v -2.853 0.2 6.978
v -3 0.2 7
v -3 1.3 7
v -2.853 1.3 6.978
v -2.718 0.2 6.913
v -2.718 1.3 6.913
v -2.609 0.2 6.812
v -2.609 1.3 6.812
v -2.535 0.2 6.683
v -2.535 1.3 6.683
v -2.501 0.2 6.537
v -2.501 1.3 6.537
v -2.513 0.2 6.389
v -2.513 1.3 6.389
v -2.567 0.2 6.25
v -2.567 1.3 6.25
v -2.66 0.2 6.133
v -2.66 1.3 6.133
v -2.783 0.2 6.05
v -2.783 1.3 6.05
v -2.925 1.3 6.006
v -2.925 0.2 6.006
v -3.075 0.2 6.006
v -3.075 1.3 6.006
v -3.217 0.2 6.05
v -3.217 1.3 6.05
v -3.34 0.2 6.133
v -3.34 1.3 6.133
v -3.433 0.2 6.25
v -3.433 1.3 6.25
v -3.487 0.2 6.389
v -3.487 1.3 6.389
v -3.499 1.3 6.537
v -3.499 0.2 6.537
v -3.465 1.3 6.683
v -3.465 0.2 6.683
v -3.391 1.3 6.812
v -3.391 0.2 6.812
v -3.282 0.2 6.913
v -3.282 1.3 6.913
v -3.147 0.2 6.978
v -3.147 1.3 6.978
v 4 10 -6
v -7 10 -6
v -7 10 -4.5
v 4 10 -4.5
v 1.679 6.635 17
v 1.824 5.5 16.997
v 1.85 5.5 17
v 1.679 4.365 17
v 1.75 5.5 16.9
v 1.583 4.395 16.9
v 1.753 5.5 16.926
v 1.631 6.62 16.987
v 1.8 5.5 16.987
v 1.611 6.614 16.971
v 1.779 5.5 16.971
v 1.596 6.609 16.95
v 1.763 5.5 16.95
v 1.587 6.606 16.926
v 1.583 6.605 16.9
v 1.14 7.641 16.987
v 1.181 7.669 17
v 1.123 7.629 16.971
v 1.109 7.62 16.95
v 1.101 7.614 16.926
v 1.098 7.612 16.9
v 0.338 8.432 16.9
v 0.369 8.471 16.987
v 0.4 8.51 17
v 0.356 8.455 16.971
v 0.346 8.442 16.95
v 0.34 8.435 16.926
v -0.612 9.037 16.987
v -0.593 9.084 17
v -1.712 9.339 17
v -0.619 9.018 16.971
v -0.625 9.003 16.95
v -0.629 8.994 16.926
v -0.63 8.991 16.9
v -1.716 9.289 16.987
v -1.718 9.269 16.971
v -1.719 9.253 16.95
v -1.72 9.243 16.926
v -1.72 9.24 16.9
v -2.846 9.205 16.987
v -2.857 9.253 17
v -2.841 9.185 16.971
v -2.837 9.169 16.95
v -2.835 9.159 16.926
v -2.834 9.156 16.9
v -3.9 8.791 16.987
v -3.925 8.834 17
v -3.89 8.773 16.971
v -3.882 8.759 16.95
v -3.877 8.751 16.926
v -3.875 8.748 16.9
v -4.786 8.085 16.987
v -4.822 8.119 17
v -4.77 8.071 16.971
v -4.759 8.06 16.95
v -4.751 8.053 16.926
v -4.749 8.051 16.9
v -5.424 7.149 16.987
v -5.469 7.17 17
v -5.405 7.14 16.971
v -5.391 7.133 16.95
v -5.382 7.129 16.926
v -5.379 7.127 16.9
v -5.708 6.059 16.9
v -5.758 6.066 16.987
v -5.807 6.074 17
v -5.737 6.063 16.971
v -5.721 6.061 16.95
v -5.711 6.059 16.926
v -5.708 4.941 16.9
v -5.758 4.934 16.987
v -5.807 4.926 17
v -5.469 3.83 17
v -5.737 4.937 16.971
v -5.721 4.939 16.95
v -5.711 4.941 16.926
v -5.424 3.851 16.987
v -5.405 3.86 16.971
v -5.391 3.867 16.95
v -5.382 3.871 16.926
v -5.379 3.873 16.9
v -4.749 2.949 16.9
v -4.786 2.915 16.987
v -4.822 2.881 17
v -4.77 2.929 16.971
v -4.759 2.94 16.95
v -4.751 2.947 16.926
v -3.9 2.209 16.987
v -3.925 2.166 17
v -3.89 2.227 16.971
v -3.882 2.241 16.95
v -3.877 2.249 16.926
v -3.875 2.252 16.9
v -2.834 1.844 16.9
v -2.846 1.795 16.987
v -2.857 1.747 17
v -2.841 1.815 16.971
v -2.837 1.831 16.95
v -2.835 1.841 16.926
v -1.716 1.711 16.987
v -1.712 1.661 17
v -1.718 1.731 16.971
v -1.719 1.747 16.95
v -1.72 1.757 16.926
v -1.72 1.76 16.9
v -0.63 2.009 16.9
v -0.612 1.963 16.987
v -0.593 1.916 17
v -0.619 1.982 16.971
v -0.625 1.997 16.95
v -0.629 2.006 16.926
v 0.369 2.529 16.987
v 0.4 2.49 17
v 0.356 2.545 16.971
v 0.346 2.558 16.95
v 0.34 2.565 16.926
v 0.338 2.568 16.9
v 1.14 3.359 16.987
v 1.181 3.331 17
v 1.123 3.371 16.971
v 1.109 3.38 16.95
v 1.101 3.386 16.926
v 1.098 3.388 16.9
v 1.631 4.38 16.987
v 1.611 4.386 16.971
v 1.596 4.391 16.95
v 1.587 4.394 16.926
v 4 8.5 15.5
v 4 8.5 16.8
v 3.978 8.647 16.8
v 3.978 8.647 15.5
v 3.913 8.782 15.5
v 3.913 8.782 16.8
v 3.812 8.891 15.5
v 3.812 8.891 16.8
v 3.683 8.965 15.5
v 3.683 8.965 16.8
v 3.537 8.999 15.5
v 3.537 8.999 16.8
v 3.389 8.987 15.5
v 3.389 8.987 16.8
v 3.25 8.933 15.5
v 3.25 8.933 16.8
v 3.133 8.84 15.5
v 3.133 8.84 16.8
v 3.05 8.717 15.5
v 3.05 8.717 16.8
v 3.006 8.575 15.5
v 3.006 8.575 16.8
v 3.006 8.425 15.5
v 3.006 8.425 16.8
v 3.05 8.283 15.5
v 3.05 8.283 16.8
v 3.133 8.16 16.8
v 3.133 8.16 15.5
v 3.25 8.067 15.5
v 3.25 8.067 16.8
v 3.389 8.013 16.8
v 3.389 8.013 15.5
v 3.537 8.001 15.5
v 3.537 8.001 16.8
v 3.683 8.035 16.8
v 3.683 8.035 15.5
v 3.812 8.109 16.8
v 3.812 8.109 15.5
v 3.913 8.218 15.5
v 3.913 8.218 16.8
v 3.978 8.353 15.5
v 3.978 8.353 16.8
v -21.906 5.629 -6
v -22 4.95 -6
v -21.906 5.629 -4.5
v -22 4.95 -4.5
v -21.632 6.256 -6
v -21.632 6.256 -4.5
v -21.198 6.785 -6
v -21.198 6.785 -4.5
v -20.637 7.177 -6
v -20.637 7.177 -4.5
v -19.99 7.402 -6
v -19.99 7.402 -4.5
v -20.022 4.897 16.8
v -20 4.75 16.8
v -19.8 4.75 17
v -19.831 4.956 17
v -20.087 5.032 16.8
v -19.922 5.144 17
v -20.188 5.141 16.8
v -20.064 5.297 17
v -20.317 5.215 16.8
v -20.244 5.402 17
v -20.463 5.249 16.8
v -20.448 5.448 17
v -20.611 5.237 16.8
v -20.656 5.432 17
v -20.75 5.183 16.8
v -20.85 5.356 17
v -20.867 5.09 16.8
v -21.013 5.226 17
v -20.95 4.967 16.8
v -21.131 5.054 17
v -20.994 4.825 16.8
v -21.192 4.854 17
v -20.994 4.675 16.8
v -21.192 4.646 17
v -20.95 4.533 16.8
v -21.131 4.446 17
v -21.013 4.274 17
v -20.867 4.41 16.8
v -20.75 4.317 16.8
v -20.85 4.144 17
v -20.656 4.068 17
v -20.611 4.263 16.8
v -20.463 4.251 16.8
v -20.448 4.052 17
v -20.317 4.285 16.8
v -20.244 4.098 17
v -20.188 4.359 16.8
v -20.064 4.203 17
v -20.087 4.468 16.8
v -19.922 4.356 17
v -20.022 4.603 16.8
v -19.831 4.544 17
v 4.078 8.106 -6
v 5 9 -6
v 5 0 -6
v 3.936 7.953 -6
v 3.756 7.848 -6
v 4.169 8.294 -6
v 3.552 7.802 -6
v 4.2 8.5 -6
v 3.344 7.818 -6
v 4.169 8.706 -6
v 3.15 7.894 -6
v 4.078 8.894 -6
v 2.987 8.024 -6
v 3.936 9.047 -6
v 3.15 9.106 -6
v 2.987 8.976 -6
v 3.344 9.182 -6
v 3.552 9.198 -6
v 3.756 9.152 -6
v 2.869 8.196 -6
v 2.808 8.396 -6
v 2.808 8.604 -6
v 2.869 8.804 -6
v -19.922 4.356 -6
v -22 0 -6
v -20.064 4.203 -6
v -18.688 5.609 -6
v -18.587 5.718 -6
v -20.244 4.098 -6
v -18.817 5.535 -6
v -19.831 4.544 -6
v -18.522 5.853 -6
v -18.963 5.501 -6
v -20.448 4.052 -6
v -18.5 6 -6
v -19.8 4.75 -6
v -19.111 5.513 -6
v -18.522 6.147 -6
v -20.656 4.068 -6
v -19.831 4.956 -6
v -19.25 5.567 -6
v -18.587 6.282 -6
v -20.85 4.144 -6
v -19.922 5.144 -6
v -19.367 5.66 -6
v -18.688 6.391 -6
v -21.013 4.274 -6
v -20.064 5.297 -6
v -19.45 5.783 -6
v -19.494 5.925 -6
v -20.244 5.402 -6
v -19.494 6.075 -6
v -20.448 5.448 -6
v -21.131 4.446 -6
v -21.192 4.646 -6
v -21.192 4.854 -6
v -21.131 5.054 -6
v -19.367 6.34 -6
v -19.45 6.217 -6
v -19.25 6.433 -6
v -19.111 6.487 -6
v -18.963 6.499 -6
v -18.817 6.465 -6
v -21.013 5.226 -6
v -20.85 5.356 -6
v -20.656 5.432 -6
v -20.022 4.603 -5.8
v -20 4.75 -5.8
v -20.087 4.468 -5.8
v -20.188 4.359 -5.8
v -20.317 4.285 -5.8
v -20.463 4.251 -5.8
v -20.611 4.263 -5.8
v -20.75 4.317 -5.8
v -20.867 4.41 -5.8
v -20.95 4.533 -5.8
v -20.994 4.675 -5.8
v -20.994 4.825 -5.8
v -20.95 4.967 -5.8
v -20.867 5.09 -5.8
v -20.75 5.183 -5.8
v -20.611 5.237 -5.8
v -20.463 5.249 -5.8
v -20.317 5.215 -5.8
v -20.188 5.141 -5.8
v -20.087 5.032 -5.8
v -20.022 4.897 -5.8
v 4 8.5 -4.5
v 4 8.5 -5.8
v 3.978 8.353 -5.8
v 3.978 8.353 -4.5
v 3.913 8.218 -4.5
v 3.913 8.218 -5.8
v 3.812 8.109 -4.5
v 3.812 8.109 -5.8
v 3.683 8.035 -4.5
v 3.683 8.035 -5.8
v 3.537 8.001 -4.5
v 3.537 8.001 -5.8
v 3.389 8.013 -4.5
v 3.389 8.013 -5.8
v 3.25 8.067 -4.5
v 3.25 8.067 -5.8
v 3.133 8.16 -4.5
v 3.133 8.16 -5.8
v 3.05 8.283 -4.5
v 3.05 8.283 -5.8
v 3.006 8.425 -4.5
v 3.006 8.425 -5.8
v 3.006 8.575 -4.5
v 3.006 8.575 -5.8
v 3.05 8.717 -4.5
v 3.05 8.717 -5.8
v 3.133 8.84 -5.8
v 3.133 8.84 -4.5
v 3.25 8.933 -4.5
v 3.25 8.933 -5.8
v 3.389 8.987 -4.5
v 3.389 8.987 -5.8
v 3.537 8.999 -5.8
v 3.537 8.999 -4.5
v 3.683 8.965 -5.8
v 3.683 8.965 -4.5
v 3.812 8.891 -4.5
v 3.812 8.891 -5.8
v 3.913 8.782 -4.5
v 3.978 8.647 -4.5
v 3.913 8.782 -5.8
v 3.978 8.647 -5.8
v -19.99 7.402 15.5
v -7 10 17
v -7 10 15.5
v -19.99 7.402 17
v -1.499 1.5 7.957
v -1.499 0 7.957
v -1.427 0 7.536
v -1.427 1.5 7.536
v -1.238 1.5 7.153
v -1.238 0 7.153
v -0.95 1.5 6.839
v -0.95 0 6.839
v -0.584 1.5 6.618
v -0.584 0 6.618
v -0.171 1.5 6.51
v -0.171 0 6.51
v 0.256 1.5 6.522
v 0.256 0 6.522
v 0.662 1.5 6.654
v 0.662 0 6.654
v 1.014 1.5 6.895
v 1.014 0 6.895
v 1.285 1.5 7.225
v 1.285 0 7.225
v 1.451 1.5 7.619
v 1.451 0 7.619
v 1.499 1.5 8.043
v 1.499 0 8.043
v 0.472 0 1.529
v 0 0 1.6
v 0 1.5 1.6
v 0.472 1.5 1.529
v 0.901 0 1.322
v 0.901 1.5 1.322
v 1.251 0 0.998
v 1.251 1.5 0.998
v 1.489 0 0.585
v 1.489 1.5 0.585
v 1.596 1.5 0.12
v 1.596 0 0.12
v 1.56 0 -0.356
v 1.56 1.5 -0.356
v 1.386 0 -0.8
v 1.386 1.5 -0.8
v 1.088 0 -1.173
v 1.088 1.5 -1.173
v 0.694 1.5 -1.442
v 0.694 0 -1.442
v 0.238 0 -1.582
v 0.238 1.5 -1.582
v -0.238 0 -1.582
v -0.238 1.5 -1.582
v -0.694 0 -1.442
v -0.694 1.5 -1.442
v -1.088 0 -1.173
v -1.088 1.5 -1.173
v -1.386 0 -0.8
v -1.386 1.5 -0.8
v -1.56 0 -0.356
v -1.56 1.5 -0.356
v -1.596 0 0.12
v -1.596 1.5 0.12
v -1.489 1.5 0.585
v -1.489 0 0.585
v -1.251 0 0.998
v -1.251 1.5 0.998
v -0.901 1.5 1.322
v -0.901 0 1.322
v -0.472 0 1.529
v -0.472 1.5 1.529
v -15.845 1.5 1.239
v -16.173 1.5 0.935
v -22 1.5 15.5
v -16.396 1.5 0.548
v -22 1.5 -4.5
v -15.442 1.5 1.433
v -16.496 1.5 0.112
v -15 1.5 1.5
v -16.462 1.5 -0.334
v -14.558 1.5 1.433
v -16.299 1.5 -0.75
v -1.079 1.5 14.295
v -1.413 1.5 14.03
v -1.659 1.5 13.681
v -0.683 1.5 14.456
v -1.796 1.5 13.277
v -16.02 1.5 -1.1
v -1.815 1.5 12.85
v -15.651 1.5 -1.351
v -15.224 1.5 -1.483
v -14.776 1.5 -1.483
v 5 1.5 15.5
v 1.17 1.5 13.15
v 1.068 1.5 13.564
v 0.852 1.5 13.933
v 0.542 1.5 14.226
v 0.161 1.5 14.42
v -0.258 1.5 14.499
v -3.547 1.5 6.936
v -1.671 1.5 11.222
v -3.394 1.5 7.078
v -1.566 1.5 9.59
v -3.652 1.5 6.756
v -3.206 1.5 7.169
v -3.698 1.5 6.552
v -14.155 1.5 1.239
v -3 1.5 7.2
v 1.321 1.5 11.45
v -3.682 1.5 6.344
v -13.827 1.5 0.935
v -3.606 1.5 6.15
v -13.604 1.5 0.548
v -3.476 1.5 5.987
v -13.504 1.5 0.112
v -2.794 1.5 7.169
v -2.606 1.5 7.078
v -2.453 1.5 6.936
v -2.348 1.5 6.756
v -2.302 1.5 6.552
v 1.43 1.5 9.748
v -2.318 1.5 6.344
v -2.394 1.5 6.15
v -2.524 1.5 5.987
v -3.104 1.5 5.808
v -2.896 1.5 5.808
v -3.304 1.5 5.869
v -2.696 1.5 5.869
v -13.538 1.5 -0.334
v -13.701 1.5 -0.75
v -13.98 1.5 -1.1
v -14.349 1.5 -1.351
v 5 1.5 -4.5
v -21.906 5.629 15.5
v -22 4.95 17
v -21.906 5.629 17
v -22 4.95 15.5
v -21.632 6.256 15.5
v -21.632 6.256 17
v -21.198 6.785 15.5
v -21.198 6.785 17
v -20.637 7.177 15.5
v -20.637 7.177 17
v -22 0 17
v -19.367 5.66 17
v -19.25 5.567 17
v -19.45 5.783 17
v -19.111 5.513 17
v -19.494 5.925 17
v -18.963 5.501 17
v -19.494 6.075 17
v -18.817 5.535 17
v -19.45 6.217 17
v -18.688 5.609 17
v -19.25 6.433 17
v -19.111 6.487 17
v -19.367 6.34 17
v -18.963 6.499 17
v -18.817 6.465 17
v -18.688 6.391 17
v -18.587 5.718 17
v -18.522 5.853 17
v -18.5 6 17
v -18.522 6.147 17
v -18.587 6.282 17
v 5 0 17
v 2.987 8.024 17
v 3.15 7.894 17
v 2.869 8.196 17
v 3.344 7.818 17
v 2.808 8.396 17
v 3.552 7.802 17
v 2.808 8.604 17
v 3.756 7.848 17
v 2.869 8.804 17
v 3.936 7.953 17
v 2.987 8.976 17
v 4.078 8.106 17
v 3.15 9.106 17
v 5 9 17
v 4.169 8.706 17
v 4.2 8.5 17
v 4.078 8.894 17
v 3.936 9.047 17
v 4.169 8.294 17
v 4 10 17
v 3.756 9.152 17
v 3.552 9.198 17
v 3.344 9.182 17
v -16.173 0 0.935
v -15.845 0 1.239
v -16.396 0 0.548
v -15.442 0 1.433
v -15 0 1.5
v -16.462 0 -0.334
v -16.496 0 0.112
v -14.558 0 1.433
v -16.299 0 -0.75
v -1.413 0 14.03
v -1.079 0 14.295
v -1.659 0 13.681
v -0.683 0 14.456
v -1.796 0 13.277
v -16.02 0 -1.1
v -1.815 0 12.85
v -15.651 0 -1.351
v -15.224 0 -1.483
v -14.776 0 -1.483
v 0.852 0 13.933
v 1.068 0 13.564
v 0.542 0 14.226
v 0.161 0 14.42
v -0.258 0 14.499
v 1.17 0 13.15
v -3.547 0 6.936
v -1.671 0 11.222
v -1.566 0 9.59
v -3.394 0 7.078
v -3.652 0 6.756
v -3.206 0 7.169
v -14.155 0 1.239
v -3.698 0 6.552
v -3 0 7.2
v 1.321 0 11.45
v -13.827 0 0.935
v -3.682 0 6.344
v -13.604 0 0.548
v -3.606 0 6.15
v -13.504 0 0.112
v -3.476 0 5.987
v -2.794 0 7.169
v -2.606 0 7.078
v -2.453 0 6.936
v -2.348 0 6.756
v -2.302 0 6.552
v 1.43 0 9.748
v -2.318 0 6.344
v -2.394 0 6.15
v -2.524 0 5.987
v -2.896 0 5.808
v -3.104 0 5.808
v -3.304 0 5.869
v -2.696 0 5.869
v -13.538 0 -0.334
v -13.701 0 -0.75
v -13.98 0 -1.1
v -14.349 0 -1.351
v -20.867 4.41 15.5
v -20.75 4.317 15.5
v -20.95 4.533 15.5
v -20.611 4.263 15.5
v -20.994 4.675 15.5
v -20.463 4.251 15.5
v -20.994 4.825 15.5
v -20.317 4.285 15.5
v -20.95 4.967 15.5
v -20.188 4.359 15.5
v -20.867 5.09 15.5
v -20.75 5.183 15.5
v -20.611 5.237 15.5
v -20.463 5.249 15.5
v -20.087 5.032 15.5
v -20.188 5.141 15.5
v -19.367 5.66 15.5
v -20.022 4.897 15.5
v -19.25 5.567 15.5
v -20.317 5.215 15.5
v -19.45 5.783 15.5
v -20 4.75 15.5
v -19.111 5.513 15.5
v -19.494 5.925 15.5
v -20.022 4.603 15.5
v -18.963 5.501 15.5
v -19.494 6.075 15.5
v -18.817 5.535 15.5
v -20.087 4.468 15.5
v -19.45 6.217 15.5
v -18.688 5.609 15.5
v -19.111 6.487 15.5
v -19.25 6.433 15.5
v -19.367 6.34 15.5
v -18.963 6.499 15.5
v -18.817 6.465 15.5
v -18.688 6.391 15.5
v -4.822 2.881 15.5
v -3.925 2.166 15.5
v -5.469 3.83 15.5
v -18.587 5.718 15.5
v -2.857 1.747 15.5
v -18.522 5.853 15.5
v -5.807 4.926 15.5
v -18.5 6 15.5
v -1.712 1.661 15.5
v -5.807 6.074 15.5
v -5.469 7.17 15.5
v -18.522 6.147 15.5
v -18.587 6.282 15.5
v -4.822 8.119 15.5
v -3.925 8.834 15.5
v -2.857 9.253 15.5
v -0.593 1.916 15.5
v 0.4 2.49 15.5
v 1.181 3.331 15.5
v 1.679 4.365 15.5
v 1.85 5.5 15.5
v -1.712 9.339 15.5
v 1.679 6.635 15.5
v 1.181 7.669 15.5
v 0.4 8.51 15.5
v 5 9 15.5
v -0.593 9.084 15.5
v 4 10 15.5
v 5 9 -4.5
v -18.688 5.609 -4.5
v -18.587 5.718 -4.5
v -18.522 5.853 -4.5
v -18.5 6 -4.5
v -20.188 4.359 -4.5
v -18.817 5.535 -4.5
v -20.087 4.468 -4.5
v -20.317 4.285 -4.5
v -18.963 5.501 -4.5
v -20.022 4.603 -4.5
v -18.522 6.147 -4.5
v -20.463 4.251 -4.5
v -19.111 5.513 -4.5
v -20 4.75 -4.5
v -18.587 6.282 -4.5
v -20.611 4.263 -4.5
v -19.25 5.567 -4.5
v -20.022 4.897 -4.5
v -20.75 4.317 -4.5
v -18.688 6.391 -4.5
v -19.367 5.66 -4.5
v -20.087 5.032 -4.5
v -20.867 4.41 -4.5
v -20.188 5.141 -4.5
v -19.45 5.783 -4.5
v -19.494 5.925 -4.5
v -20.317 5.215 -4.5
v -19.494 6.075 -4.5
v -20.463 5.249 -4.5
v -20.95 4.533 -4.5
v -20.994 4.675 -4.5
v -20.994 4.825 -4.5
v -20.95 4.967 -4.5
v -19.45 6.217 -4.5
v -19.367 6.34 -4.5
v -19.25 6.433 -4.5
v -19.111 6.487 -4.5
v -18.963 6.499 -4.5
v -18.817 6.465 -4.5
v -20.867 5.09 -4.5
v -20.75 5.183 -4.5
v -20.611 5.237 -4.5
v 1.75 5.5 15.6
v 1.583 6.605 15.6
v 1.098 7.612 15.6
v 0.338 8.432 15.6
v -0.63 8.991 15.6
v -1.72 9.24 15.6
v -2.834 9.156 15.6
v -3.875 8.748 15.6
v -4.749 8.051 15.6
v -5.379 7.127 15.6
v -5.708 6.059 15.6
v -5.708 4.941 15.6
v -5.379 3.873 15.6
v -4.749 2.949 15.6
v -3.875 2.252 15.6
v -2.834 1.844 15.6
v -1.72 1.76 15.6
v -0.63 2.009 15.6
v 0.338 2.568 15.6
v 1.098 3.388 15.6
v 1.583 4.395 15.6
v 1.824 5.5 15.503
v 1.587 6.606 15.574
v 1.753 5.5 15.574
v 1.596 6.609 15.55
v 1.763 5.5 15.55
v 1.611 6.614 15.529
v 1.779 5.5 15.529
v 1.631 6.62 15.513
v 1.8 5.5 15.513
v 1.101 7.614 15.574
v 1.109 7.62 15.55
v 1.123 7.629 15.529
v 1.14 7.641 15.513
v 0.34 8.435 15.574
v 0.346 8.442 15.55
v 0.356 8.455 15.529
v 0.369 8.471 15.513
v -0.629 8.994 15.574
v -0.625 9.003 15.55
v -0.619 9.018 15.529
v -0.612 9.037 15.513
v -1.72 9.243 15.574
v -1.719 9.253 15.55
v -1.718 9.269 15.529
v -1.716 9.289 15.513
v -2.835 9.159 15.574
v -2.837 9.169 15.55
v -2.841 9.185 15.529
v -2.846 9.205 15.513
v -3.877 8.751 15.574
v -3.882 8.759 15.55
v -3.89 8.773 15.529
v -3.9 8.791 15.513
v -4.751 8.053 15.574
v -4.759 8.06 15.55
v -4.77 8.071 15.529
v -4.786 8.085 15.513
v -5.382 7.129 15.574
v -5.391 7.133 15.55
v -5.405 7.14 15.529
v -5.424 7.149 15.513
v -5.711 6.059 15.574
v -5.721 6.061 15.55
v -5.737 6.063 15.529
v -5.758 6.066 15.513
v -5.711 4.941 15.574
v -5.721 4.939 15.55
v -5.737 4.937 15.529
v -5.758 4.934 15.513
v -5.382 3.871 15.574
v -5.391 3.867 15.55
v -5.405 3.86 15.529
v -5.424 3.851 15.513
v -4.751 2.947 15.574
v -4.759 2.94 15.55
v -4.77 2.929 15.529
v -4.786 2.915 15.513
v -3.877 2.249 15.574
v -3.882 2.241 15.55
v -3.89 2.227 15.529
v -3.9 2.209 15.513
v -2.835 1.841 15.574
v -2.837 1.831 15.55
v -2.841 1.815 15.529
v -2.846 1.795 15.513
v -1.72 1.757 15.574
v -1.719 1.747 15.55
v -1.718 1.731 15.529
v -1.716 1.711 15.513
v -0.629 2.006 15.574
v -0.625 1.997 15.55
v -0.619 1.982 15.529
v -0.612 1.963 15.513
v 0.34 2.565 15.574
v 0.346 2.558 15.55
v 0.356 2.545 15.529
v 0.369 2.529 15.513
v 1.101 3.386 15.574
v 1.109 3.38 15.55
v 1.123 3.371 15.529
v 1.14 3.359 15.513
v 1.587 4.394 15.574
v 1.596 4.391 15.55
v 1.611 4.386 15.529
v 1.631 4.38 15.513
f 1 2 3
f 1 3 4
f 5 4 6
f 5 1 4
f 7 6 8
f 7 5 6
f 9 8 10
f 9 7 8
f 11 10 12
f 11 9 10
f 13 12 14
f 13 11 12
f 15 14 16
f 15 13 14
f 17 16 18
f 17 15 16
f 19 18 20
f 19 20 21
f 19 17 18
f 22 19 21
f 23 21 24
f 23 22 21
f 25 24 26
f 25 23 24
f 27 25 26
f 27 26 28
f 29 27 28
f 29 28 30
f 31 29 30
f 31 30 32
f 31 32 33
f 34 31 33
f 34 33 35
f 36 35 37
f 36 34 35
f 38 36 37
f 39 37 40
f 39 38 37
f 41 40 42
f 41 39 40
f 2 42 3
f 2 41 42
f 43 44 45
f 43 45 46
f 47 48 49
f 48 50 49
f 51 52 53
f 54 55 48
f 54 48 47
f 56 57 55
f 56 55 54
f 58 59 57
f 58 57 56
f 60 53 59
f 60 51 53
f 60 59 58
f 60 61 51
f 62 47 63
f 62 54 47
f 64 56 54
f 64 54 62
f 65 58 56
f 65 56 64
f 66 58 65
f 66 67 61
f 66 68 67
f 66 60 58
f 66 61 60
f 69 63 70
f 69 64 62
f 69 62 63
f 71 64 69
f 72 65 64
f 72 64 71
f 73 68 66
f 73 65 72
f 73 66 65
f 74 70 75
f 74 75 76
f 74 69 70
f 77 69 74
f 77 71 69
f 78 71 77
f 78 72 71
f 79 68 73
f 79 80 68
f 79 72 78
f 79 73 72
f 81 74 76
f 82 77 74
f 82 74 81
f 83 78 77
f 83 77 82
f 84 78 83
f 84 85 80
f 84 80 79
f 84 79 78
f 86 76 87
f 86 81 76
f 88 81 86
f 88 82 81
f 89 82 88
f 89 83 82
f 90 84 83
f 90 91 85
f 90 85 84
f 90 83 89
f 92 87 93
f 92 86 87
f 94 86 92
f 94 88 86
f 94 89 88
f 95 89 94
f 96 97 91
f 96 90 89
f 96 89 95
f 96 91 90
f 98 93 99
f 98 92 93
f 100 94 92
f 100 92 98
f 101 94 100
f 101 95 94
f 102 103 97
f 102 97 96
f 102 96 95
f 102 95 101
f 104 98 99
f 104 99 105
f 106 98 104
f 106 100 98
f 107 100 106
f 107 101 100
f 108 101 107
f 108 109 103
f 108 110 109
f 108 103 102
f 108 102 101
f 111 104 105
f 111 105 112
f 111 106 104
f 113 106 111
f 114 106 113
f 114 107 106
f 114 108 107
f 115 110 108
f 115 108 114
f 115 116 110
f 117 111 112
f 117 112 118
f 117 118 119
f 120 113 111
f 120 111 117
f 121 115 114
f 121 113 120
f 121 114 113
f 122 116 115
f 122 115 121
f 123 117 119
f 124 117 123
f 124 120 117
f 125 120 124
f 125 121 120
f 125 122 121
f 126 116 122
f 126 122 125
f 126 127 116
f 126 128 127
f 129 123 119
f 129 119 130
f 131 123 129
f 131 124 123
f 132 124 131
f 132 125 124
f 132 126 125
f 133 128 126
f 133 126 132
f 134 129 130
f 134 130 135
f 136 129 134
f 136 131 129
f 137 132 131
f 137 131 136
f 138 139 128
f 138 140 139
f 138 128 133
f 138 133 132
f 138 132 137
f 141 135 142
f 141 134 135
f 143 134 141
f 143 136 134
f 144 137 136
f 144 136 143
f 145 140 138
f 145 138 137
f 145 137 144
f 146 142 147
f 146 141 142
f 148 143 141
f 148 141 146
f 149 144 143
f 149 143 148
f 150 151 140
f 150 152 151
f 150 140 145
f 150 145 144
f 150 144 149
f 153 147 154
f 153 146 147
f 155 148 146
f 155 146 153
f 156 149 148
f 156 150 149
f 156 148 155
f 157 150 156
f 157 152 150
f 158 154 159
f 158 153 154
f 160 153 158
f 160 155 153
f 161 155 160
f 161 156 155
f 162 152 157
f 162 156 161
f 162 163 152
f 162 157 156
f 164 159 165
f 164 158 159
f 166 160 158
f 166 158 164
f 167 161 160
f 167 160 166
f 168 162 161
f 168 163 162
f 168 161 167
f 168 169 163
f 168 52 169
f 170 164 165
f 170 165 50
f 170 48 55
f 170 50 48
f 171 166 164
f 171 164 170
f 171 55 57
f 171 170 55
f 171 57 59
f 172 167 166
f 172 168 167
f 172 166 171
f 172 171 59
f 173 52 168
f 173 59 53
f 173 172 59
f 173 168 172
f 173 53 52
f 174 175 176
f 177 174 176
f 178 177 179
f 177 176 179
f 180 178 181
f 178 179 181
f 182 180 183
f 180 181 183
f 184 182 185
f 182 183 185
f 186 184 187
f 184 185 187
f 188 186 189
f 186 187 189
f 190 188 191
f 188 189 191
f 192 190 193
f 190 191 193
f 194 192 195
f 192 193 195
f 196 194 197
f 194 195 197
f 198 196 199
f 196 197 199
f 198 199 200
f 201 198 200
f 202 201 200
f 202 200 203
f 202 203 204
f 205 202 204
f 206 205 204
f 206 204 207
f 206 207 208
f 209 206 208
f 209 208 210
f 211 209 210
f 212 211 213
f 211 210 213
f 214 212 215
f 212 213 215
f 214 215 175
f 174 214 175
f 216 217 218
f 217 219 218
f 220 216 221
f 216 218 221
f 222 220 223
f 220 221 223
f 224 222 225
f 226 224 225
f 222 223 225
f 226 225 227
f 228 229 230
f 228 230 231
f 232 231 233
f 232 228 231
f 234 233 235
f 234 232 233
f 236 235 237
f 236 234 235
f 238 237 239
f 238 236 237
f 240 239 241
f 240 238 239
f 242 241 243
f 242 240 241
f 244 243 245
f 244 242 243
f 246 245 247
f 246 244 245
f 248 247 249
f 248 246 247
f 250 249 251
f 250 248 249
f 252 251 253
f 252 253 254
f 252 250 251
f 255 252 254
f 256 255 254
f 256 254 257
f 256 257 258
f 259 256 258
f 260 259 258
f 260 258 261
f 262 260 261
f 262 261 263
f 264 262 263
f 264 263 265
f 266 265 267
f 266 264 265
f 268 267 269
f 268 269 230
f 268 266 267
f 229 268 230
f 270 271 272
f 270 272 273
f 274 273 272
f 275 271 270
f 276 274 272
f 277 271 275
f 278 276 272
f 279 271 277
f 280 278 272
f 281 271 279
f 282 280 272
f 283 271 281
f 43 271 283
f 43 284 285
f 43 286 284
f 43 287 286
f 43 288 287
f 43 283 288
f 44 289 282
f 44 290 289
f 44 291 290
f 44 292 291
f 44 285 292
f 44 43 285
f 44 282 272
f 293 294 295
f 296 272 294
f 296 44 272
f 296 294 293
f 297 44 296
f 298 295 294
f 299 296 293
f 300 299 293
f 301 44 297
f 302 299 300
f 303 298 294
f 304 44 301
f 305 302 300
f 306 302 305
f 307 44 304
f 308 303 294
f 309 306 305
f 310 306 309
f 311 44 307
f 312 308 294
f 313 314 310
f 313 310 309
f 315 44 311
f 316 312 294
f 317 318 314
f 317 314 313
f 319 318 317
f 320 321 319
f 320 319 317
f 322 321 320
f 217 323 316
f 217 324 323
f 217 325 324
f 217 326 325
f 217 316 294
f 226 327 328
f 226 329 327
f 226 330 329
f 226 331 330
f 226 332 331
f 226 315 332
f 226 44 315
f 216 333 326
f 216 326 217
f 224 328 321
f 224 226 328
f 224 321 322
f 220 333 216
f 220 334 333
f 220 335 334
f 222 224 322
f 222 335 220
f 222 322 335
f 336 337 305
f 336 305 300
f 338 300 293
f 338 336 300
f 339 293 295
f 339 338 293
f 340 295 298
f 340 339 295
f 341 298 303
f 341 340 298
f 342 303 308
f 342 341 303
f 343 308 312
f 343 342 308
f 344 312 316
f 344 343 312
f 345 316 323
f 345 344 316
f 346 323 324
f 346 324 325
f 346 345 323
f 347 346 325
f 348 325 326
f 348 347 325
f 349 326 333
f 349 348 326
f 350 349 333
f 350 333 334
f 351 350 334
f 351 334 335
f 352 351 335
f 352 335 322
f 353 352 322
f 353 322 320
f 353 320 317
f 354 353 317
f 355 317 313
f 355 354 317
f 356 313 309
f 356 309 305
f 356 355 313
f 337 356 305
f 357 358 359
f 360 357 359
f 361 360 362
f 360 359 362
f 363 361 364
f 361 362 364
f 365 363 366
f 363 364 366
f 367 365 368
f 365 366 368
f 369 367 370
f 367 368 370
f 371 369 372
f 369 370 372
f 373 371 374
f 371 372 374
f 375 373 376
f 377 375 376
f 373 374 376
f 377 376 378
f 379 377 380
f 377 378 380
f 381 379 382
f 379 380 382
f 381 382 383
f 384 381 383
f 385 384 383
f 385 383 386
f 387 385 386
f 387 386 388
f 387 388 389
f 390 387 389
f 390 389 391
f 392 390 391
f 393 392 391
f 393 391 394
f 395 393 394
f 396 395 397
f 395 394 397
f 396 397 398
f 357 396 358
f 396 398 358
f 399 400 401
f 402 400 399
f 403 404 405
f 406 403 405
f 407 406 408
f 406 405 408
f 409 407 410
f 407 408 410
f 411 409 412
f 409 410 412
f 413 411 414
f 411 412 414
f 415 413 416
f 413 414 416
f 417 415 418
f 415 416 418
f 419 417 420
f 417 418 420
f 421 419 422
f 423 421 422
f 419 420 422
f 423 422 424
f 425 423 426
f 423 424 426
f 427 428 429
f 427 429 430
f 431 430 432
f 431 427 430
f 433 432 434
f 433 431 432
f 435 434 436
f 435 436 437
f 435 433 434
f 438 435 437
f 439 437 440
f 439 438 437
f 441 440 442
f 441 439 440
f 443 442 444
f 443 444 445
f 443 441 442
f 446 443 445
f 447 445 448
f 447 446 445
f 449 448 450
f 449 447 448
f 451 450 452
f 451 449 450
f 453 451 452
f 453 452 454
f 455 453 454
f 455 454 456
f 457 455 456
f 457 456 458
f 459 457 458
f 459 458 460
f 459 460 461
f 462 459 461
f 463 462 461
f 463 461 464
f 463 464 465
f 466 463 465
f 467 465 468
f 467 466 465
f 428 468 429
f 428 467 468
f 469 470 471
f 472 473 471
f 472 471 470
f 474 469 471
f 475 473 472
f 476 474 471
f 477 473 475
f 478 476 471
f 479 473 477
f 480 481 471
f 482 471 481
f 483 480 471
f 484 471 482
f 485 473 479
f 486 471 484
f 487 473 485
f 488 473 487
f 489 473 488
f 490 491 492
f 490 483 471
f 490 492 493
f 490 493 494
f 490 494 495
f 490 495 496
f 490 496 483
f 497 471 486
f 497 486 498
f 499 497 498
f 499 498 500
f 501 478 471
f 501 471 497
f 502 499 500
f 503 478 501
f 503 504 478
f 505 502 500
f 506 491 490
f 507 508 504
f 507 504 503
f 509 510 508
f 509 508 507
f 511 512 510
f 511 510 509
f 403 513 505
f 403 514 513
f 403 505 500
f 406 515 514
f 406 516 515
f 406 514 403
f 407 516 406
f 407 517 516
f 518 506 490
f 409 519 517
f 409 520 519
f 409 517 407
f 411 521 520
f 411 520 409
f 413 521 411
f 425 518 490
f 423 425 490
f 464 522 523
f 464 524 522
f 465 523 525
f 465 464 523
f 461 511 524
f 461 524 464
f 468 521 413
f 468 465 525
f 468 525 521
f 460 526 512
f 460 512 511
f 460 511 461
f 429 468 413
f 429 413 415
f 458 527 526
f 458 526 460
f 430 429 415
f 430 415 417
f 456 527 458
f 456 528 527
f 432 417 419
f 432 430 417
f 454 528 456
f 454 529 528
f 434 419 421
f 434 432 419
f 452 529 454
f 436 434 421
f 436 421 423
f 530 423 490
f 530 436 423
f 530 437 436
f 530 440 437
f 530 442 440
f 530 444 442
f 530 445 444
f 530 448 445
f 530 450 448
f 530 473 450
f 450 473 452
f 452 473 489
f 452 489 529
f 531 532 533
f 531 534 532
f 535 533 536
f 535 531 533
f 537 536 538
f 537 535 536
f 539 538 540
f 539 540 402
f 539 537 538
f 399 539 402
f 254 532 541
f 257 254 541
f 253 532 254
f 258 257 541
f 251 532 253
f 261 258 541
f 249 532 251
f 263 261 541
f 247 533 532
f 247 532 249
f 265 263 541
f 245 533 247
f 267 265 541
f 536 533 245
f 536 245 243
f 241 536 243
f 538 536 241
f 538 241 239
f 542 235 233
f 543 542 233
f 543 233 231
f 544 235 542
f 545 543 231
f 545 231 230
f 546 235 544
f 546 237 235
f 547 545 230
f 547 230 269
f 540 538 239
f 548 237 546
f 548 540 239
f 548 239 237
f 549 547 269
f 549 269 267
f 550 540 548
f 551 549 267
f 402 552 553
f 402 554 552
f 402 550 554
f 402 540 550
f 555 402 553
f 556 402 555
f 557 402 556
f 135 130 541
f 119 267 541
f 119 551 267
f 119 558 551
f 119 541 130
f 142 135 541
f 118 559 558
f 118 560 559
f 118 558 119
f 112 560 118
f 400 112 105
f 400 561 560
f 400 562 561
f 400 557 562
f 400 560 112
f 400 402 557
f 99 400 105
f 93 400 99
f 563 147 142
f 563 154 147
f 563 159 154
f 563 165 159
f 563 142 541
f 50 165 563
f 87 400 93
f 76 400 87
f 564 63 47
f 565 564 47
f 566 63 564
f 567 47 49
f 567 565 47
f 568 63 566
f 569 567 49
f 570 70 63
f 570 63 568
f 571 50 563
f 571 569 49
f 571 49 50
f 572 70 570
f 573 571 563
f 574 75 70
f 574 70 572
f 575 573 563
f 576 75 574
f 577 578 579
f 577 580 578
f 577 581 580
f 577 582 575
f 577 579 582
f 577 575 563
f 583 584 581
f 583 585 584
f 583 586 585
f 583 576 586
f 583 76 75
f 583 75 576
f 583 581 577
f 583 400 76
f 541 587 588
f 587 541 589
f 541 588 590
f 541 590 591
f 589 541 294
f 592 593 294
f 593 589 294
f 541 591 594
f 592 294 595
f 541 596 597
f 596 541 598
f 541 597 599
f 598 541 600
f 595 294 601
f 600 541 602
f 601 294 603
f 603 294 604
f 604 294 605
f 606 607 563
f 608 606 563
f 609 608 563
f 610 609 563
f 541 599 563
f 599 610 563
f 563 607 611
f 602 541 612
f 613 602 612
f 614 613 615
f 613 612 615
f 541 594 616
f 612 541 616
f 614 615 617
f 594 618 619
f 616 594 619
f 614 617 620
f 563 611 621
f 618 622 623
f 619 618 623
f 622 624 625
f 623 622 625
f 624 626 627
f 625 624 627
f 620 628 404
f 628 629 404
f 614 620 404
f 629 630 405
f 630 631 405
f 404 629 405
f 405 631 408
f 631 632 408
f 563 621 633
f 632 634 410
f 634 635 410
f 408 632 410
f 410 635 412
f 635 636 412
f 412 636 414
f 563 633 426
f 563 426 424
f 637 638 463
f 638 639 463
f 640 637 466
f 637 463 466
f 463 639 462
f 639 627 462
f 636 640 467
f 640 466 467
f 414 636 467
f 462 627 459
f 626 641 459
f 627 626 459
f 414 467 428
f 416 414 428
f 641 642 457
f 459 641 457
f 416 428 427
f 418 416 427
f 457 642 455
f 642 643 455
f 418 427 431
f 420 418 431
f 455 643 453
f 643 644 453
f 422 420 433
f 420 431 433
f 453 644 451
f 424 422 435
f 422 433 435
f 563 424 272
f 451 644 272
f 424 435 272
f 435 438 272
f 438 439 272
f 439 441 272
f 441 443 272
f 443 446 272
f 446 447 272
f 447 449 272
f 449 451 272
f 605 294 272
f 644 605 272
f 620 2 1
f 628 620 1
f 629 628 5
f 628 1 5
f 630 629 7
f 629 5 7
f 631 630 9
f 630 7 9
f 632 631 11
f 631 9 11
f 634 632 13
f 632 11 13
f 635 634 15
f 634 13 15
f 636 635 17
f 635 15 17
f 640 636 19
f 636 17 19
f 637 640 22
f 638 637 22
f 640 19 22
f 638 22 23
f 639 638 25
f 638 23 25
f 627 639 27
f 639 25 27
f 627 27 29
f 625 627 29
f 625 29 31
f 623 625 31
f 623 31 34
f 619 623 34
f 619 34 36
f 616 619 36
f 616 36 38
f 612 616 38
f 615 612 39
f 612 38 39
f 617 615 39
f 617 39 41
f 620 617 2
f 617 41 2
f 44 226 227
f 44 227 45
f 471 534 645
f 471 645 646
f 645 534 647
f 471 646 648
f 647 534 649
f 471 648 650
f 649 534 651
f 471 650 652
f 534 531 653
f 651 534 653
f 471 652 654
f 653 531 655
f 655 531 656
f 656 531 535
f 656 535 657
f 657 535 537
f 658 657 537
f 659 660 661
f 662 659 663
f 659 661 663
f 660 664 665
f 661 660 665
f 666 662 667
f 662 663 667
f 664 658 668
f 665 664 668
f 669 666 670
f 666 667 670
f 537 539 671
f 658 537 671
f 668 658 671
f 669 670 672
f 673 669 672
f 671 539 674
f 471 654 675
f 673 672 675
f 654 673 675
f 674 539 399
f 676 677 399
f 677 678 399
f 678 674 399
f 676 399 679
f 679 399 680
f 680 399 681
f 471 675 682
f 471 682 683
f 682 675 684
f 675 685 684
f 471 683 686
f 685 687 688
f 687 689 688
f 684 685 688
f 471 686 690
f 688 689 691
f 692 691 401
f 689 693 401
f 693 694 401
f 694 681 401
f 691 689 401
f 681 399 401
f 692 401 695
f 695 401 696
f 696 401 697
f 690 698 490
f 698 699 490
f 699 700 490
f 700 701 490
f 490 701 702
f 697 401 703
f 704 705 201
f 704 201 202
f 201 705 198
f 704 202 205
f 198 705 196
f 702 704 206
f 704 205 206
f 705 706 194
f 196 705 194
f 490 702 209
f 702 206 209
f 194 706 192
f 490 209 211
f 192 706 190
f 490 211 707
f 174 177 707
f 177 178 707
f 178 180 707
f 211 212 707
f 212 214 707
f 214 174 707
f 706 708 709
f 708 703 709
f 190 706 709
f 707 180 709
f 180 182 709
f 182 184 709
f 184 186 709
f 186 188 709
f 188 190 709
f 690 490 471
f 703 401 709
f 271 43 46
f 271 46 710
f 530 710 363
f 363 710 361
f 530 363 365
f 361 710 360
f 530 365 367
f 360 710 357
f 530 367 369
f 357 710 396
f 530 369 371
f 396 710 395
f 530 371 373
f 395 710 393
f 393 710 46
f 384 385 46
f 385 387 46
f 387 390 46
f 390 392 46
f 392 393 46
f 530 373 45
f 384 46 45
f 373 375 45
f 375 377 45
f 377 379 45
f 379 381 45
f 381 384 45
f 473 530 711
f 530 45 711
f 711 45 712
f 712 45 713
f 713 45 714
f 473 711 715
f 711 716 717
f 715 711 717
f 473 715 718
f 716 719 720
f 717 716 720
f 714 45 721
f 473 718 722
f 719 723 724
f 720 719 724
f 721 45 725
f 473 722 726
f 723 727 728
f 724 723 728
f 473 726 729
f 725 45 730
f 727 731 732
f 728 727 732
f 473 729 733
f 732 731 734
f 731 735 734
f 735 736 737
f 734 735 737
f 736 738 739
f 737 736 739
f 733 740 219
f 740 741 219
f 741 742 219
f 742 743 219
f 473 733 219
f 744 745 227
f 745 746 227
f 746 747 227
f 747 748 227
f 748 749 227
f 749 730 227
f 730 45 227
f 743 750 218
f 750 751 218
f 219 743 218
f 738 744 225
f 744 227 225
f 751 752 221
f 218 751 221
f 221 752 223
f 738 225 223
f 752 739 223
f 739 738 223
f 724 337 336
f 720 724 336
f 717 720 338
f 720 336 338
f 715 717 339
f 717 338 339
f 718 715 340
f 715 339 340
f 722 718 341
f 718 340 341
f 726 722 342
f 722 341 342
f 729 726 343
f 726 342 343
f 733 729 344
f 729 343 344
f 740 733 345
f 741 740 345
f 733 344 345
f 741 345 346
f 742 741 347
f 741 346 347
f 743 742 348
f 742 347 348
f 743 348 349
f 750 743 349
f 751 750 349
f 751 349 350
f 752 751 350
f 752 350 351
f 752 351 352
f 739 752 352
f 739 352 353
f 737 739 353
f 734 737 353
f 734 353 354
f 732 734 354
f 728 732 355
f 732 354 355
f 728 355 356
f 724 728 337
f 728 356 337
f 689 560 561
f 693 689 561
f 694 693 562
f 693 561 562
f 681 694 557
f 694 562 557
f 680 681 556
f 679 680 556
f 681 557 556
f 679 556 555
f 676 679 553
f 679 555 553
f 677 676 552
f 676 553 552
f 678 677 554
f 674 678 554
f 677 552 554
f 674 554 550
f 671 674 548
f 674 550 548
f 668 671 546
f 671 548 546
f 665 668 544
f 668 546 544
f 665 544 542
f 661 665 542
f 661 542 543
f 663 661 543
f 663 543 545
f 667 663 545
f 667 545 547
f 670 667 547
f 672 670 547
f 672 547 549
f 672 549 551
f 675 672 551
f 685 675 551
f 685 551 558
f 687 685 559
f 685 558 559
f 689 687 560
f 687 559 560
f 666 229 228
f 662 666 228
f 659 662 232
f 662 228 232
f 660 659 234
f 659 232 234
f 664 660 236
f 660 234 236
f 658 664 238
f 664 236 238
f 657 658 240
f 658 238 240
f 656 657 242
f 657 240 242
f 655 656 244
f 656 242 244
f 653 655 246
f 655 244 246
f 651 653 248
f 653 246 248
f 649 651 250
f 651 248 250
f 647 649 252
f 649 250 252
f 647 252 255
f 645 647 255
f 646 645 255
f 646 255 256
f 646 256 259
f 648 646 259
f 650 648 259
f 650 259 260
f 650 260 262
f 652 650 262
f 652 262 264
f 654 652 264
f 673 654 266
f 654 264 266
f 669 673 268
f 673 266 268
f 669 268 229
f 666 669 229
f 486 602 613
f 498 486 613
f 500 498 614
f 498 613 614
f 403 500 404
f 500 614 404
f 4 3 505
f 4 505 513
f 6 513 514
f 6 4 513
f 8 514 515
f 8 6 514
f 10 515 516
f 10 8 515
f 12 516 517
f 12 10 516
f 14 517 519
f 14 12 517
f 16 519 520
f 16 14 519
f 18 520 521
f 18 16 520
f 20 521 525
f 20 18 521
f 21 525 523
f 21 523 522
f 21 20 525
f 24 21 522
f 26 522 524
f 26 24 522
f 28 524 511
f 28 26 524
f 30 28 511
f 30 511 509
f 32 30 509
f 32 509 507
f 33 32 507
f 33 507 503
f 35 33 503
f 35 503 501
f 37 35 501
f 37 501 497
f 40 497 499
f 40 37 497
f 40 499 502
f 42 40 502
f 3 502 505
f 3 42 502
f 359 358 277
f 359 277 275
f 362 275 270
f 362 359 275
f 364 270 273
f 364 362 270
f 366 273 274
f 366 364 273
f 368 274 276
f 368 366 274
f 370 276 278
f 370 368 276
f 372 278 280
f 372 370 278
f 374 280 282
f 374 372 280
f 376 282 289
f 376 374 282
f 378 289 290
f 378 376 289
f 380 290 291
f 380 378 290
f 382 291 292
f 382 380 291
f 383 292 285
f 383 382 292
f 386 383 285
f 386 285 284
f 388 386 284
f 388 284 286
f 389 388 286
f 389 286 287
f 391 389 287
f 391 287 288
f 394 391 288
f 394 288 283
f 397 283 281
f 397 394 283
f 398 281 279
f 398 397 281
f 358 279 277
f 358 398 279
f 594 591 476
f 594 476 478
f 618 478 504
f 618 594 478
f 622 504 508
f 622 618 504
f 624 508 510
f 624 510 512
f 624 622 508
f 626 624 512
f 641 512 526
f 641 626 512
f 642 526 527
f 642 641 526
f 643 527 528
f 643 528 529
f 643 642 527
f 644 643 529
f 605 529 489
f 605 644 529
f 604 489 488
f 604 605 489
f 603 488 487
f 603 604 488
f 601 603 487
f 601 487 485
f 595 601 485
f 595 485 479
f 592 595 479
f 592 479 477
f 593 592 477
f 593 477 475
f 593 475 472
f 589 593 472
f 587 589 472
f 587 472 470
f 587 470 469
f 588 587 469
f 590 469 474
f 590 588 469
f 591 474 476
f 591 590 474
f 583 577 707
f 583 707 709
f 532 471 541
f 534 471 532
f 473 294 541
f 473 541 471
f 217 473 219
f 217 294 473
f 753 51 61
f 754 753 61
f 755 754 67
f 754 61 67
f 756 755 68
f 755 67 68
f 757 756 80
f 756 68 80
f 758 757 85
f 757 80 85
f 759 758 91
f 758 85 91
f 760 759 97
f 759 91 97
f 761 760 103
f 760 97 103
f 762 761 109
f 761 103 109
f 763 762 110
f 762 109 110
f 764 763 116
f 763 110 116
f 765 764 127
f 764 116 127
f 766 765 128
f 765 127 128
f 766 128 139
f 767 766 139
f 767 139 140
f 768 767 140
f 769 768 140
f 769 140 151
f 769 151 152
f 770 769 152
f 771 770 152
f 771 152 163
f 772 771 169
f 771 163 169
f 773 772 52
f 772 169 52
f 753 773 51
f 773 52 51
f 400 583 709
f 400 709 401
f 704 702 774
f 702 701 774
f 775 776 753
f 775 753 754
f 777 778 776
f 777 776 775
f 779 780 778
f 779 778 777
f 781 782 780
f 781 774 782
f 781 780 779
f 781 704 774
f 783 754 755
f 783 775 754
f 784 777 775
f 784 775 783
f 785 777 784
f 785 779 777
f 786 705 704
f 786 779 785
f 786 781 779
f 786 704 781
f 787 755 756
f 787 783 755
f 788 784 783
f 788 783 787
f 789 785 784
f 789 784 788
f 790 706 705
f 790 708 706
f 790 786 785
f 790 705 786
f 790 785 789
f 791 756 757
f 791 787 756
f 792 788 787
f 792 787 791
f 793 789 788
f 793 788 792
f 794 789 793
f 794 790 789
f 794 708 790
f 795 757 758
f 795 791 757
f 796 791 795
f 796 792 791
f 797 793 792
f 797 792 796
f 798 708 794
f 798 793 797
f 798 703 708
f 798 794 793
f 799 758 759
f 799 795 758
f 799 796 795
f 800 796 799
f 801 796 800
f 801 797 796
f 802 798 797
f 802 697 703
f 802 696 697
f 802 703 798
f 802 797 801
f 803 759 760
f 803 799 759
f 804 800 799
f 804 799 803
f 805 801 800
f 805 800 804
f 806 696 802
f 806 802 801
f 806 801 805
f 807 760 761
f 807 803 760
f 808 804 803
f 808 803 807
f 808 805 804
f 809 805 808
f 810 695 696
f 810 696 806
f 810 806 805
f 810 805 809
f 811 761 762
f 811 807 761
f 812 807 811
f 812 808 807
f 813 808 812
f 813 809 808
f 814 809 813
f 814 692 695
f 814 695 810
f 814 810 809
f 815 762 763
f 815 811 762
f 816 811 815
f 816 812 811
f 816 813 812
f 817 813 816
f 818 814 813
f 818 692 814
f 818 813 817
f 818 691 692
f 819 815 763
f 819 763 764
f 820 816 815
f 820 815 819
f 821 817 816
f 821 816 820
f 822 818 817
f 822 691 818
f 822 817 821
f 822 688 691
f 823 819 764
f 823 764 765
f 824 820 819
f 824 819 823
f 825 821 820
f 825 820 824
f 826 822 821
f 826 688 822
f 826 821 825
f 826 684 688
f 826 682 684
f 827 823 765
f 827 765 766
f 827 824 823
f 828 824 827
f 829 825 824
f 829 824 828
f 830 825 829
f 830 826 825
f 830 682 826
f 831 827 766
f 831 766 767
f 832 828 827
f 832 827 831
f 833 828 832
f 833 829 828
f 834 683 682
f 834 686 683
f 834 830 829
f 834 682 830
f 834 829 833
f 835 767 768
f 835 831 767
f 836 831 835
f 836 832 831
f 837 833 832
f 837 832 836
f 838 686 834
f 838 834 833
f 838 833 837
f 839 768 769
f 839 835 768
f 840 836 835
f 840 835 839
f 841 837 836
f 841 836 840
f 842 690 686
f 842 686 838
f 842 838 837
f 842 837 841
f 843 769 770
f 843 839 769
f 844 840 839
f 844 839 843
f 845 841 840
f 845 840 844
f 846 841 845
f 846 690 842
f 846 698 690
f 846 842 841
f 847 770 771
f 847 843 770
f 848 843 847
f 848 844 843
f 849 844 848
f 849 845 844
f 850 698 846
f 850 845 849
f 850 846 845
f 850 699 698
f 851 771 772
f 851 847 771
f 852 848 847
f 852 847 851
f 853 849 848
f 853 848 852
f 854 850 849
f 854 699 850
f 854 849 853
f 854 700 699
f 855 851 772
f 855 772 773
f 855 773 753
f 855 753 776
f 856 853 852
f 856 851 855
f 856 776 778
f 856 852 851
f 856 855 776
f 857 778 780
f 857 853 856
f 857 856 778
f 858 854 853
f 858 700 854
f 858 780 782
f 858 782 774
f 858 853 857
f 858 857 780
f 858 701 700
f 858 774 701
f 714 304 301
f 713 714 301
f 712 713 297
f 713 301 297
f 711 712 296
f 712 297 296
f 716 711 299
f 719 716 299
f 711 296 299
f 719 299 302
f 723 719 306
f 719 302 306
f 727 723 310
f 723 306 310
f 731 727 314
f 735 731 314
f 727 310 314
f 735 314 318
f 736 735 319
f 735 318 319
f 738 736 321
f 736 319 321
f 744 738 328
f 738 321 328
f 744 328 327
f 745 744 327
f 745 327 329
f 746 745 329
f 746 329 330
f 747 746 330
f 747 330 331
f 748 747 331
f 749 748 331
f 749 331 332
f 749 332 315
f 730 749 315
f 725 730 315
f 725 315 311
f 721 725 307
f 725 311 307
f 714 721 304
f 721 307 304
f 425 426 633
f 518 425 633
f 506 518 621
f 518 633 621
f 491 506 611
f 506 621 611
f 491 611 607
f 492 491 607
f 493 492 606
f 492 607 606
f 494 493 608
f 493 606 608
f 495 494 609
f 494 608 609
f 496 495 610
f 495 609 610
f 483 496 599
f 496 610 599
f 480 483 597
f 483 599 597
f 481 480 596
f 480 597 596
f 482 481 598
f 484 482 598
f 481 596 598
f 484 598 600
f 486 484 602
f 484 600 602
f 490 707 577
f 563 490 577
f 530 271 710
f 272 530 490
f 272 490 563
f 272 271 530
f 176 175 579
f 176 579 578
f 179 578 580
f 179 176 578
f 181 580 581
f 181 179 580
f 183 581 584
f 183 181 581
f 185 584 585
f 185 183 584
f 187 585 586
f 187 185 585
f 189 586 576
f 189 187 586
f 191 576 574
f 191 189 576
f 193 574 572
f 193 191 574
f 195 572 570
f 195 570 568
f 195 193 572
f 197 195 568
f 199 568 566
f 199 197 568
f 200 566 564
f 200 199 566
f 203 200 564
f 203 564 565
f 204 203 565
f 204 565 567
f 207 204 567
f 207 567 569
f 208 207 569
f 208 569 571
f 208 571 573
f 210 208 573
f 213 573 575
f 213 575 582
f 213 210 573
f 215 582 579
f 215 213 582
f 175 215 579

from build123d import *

# Parameters (mm, degrees)
SKETCH1_W      = 27
SKETCH1_H      = 23
SKETCH1_R      = 1.6
SKETCH1_R_2    = 1.5
SKETCH1_R_3    = 0.5
EXTRUDE1_DEPTH = 1.5
SKETCH2_R      = 0.5
SKETCH2_R_2    = 3.75
EXTRUDE2_DEPTH = 1.5
SKETCH3_R      = 0.5
EXTRUDE3_DEPTH = 1.5
FILLET1_R      = 0.1
CHAMFER1_SIZE  = 0.2
FILLET2_R      = 2.5


with BuildPart() as part:
    # Sketch1 → Extrude1 (new body)
    with BuildSketch(Plane(origin=(0, 0, 0), x_dir=(1, 0, 0), z_dir=(0, 1, 0))):
        with Locations((-8.5, -5.5)):
            Rectangle(SKETCH1_W, SKETCH1_H)
        with Locations(Location((0, 0, 0), (0, 0, 270))):  # turned: the seam where the file's is
            Circle(SKETCH1_R, mode=Mode.SUBTRACT)
        with Locations(Location((-15, 0, 0), (0, 0, 270))):  # turned: the seam where the file's is
            Circle(SKETCH1_R_2, mode=Mode.SUBTRACT)
        with Locations(Location((-3, -6.5, 0), (0, 0, 270))):  # turned: the seam where the file's is
            Circle(SKETCH1_R_3, mode=Mode.SUBTRACT)
        with BuildLine():
            ThreePointArc((-1.814657257, -12.850061187), (-1.613249333, -10.406431255), (-1.49938813, -7.957160339))
            ThreePointArc((-1.49938813, -7.957160339), (0.042839661, -6.50061187), (1.49938813, -8.042839661))
            ThreePointArc((1.49938813, -8.042839661), (1.380542383, -10.599333203), (1.170317351, -13.149938813))
            ThreePointArc((1.170317351, -13.149938813), (-0.472108766, -14.492487304), (-1.814657257, -12.850061187))
        make_face(mode=Mode.SUBTRACT)
    extrude(amount=EXTRUDE1_DEPTH)

    # Sketch2 → Extrude2 (add)
    with BuildSketch(Plane.XY.offset(17)):
        Polygon((-22, 1.5), (5, 1.5), (5, 9), (4, 10), (-7, 10), (-22, 7), align=None)
        with Locations((3.5, 8.5)):
            Circle(SKETCH2_R, mode=Mode.SUBTRACT)
        with Locations((-2, 5.5)):
            Circle(SKETCH2_R_2, mode=Mode.SUBTRACT)
        with Locations((-20.5, 4.75)):
            Circle(SKETCH2_R, mode=Mode.SUBTRACT)
        with Locations((-19, 6)):
            Circle(SKETCH2_R, mode=Mode.SUBTRACT)
    extrude(amount=-EXTRUDE2_DEPTH)

    # Sketch3 → Extrude3 (add)
    with BuildSketch(Plane(origin=(0, 0, -6), x_dir=(-1, 0, 0), z_dir=(0, 0, -1))):
        Polygon((-5, 1.5), (22, 1.5), (22, 7), (7, 10), (-4, 10), (-5, 9), align=None)
        with Locations(Location((-3.5, 8.5, 0), (0, 0, 180))):  # turned: the seam where the file's is
            Circle(SKETCH3_R, mode=Mode.SUBTRACT)
        with Locations(Location((20.5, 4.75, 0), (0, 0, 180))):  # turned: the seam where the file's is
            Circle(SKETCH3_R, mode=Mode.SUBTRACT)
        with Locations(Location((19, 6, 0), (0, 0, 180))):  # turned: the seam where the file's is
            Circle(SKETCH3_R, mode=Mode.SUBTRACT)
    extrude(amount=-EXTRUDE3_DEPTH)

    # Fillet1
    fillet1_edges = [part.edges().sort_by_distance(p)[0] for p in [
        (-5.75, 5.5, 15.5),
        (-5.75, 5.5, 17),
    ]]
    fillet(fillet1_edges, radius=FILLET1_R)

    # Chamfer1
    chamfer1_edges = [part.edges().sort_by_distance(p)[0] for p in [
        (-3, 0, 6),
        (-3, 1.5, 6),
        (3, 8.5, 17),
        (-21, 4.75, 17),
        (3, 8.5, -6),
        (-21, 4.75, -6),
    ]]
    chamfer(chamfer1_edges, length=CHAMFER1_SIZE)

    # Fillet2
    fillet2_edges = [part.edges().sort_by_distance(p)[0] for p in [
        (-22, 7, 16.25),
        (-22, 7, -5.25),
    ]]
    fillet(fillet2_edges, radius=FILLET2_R)


solid = part.part
